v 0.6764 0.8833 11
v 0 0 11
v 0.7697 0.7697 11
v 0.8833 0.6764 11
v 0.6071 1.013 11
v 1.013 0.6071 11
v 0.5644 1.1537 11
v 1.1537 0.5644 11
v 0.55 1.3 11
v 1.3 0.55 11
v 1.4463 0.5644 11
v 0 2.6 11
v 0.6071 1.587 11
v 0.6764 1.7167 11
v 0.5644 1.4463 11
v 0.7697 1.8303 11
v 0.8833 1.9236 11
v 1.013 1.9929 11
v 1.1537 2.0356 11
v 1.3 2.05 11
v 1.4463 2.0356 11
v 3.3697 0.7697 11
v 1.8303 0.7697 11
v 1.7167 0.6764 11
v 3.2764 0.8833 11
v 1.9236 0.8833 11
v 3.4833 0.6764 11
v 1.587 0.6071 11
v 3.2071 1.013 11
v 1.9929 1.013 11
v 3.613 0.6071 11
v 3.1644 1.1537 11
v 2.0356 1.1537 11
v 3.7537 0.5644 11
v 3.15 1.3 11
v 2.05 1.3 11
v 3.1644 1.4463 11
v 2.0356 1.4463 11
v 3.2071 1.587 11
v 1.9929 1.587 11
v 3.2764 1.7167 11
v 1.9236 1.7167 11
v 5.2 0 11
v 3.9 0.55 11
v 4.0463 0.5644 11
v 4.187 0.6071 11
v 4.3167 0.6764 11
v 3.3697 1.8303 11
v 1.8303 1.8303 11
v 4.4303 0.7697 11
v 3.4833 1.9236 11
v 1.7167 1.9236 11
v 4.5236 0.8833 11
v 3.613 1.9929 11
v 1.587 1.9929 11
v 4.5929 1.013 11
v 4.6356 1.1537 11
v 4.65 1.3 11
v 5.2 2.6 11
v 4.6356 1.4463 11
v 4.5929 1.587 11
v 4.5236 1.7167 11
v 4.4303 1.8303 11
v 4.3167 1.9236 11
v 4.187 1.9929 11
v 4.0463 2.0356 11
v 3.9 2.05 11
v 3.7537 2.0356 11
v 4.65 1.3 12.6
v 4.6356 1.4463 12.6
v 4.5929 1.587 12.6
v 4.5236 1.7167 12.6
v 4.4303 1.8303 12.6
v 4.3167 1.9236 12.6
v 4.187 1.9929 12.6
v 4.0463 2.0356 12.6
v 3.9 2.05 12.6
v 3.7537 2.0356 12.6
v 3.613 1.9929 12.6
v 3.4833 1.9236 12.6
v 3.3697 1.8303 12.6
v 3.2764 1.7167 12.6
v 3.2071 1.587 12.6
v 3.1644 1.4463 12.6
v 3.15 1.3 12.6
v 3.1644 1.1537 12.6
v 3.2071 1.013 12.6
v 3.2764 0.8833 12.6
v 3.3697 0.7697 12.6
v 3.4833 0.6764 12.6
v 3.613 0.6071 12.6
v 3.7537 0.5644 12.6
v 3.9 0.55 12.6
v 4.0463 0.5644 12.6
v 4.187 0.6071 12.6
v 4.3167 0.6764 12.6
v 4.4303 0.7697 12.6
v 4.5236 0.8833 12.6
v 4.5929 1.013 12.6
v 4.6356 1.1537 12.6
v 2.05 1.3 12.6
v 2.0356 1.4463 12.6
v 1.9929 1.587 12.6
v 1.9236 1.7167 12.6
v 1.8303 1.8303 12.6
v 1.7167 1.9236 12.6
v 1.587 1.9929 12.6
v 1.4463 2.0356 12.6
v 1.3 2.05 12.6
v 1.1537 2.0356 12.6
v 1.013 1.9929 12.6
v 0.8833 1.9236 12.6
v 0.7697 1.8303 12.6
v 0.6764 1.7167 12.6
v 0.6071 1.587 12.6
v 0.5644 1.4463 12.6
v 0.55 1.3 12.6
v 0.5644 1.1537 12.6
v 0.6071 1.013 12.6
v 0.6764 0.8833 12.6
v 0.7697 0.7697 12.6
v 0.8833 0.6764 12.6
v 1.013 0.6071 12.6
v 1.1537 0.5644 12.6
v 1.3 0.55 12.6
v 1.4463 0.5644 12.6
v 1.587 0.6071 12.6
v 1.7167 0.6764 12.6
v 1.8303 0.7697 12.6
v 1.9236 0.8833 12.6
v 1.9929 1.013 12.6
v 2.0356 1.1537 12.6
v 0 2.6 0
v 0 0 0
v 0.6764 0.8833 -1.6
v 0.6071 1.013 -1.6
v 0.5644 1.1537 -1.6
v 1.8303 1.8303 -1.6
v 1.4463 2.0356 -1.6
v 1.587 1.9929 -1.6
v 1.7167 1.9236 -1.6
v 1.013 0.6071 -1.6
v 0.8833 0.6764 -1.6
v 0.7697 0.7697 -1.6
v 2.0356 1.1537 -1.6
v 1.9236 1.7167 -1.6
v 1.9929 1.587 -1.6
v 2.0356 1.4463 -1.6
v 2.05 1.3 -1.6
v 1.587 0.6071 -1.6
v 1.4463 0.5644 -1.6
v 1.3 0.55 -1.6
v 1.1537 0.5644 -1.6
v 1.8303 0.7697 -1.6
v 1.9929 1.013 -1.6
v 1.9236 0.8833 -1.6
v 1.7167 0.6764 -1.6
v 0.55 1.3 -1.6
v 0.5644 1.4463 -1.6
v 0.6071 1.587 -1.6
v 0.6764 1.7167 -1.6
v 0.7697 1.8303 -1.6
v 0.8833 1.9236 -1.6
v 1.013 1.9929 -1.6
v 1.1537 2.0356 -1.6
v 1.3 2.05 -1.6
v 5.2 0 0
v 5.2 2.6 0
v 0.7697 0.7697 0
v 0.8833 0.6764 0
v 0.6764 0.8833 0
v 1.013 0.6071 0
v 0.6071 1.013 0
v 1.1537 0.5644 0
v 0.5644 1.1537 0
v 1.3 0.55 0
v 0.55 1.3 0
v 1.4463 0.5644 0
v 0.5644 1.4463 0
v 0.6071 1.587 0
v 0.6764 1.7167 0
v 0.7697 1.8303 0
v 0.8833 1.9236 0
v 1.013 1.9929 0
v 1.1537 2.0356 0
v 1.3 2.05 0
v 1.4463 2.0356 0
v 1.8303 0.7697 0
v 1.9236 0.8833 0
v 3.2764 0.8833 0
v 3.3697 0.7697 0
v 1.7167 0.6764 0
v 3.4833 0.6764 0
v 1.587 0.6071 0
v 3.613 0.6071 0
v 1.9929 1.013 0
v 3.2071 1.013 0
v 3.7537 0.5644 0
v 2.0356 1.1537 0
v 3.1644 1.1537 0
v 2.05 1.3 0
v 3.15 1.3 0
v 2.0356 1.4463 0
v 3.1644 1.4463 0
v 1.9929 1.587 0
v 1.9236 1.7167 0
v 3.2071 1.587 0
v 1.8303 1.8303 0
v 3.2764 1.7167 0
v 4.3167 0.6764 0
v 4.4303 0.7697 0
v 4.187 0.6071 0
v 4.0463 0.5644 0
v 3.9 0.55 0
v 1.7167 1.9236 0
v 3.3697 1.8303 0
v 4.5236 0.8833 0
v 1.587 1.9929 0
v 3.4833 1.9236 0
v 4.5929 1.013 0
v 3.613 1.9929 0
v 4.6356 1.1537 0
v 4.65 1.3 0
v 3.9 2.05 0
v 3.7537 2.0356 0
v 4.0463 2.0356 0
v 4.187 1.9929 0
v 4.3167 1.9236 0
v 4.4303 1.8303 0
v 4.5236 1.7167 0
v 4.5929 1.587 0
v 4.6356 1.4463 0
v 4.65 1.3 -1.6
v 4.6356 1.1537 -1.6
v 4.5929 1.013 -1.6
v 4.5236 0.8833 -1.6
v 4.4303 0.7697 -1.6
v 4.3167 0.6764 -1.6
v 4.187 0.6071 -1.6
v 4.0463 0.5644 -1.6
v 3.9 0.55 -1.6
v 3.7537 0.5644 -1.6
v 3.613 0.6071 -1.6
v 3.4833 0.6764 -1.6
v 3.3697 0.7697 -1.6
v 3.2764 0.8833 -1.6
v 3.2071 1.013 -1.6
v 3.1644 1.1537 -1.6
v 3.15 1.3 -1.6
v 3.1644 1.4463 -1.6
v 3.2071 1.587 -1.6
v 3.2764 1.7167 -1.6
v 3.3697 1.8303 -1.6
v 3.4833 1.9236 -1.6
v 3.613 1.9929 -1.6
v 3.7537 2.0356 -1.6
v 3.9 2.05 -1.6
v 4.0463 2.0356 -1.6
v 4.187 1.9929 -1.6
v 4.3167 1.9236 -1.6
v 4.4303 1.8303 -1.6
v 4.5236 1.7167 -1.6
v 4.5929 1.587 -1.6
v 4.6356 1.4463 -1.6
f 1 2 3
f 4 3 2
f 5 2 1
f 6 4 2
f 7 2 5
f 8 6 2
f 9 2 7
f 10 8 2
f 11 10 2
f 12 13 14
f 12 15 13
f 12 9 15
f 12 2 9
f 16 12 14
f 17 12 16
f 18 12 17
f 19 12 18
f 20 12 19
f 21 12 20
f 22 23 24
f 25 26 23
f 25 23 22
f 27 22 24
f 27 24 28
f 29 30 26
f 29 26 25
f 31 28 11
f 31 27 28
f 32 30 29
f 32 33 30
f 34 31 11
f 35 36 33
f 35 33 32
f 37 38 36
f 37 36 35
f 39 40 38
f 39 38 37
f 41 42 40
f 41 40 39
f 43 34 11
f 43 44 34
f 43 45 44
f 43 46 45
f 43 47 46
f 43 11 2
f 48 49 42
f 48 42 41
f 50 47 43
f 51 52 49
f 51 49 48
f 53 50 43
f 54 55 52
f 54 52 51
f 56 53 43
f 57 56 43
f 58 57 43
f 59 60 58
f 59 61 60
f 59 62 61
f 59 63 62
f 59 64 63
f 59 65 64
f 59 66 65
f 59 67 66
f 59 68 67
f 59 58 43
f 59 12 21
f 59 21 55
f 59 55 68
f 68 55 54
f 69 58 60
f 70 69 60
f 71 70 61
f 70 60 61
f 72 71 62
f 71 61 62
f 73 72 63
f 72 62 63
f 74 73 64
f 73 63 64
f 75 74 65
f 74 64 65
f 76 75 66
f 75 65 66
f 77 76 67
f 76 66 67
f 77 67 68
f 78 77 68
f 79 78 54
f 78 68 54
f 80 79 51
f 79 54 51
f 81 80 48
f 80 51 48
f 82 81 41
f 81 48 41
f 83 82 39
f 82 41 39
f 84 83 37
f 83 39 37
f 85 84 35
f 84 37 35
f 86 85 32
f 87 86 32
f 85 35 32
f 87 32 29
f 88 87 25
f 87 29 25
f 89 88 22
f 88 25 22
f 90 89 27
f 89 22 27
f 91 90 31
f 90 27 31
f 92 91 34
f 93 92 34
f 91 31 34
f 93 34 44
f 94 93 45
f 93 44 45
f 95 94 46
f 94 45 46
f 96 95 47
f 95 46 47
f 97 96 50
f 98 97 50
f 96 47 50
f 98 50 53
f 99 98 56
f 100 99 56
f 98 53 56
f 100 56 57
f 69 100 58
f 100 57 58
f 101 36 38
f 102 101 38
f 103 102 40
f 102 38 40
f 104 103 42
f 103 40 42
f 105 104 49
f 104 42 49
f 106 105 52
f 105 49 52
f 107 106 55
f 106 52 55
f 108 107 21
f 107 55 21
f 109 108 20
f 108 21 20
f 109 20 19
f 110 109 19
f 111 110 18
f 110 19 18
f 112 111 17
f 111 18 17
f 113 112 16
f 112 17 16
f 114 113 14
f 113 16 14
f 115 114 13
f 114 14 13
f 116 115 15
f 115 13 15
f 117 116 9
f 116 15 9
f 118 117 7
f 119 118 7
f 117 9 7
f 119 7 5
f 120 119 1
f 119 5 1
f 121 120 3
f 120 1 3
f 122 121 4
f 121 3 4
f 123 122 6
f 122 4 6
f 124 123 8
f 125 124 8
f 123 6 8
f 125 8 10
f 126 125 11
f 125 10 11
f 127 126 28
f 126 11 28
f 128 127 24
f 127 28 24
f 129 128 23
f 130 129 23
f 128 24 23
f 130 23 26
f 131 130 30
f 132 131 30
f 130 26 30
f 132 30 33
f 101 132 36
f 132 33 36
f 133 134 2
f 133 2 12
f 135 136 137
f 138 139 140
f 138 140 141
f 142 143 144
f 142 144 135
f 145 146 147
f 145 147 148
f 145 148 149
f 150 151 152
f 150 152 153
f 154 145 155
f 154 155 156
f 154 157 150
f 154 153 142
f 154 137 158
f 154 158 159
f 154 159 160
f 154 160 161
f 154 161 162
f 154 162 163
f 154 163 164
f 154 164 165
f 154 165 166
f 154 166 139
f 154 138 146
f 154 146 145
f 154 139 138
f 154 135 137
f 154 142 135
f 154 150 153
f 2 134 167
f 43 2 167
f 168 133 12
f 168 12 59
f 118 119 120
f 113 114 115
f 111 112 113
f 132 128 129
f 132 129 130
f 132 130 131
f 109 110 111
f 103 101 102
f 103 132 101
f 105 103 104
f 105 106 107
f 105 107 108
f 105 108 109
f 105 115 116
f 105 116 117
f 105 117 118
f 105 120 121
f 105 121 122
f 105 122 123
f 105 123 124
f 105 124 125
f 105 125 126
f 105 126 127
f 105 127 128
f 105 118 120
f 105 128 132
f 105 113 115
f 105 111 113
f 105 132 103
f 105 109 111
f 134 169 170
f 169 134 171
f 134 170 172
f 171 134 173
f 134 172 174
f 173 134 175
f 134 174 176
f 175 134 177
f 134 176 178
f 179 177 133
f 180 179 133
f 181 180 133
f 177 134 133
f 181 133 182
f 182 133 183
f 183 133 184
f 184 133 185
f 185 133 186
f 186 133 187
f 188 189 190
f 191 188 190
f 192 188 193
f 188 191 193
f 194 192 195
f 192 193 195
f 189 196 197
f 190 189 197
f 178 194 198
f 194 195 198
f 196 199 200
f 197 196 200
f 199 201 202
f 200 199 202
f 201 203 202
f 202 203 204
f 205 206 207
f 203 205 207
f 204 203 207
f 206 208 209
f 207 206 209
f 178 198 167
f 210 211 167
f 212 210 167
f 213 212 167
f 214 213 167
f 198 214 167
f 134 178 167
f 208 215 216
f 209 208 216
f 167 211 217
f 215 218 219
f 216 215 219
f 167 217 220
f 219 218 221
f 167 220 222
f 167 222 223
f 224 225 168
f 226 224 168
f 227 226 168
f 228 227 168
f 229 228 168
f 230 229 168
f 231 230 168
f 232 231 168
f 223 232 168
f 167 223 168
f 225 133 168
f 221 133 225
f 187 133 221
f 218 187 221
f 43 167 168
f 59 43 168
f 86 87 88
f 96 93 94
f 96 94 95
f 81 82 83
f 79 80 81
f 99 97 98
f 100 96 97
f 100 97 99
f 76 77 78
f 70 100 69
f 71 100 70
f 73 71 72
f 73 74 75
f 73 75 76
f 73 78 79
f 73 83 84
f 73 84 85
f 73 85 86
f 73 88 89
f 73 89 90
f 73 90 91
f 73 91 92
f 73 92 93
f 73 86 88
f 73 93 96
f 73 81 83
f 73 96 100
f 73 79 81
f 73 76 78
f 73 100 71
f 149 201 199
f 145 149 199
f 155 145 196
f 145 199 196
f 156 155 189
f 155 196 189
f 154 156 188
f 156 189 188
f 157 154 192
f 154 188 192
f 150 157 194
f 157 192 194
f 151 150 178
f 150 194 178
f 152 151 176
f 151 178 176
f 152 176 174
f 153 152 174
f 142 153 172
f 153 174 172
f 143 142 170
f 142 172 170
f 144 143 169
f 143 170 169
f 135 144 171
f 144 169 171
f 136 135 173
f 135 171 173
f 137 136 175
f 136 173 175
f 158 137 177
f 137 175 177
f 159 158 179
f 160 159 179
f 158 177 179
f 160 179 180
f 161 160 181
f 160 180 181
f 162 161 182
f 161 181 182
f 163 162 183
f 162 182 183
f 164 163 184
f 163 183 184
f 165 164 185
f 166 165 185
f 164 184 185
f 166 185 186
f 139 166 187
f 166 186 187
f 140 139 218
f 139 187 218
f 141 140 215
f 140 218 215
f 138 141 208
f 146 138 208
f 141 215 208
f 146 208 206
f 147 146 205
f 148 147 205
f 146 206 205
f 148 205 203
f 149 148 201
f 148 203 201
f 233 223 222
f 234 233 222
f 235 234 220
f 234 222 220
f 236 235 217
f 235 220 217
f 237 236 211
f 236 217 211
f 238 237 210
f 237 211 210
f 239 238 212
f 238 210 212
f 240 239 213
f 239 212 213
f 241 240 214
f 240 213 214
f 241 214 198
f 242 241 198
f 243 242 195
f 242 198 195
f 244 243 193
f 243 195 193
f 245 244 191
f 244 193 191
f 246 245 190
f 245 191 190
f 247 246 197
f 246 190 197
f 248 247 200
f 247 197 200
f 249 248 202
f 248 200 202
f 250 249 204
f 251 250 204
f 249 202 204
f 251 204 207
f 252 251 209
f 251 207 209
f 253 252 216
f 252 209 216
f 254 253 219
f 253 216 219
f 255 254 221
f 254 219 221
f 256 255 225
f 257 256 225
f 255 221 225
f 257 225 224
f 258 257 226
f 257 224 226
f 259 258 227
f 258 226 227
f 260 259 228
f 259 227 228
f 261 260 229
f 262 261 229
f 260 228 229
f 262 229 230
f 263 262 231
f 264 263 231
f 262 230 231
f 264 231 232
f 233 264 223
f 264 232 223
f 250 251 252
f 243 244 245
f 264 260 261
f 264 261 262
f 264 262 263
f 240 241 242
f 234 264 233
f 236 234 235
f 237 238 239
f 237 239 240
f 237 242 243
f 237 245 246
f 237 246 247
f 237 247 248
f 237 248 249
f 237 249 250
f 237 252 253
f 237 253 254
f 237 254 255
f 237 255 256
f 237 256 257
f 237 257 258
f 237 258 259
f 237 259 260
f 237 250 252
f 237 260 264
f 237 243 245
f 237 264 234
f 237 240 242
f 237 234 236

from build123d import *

# Parameters (mm, degrees)
F0_W     = 5.2
F0_H     = 2.6
F1_DEPTH = 11
F2_R     = 0.75
F3_DEPTH = 1.6
F4_R     = 0.75
F5_DEPTH = 1.6


with BuildPart() as f1:
    # F0 (on Top) → F1 (new body)
    with BuildSketch(Plane.XY):
        with Locations((2.6, 1.3)):
            Rectangle(F0_W, F0_H)
    extrude(amount=F1_DEPTH)

    # F2 (on face) → F3 (join)
    with BuildSketch(Plane.XY.offset(11)):
        with Locations((1.3, 1.3)):
            Circle(F2_R)
        with Locations((3.9, 1.3)):
            Circle(F2_R)
    extrude(amount=F3_DEPTH)

    # F4 (on face) → F5 (join)
    with BuildSketch(Plane(origin=(0, 0, 0), x_dir=(1, 0, 0), z_dir=(0, 0, -1))):
        with Locations((1.3, -1.3)):
            Circle(F4_R)
        with Locations((3.9, -1.3)):
            Circle(F4_R)
    extrude(amount=F5_DEPTH)


solid = f1.part
